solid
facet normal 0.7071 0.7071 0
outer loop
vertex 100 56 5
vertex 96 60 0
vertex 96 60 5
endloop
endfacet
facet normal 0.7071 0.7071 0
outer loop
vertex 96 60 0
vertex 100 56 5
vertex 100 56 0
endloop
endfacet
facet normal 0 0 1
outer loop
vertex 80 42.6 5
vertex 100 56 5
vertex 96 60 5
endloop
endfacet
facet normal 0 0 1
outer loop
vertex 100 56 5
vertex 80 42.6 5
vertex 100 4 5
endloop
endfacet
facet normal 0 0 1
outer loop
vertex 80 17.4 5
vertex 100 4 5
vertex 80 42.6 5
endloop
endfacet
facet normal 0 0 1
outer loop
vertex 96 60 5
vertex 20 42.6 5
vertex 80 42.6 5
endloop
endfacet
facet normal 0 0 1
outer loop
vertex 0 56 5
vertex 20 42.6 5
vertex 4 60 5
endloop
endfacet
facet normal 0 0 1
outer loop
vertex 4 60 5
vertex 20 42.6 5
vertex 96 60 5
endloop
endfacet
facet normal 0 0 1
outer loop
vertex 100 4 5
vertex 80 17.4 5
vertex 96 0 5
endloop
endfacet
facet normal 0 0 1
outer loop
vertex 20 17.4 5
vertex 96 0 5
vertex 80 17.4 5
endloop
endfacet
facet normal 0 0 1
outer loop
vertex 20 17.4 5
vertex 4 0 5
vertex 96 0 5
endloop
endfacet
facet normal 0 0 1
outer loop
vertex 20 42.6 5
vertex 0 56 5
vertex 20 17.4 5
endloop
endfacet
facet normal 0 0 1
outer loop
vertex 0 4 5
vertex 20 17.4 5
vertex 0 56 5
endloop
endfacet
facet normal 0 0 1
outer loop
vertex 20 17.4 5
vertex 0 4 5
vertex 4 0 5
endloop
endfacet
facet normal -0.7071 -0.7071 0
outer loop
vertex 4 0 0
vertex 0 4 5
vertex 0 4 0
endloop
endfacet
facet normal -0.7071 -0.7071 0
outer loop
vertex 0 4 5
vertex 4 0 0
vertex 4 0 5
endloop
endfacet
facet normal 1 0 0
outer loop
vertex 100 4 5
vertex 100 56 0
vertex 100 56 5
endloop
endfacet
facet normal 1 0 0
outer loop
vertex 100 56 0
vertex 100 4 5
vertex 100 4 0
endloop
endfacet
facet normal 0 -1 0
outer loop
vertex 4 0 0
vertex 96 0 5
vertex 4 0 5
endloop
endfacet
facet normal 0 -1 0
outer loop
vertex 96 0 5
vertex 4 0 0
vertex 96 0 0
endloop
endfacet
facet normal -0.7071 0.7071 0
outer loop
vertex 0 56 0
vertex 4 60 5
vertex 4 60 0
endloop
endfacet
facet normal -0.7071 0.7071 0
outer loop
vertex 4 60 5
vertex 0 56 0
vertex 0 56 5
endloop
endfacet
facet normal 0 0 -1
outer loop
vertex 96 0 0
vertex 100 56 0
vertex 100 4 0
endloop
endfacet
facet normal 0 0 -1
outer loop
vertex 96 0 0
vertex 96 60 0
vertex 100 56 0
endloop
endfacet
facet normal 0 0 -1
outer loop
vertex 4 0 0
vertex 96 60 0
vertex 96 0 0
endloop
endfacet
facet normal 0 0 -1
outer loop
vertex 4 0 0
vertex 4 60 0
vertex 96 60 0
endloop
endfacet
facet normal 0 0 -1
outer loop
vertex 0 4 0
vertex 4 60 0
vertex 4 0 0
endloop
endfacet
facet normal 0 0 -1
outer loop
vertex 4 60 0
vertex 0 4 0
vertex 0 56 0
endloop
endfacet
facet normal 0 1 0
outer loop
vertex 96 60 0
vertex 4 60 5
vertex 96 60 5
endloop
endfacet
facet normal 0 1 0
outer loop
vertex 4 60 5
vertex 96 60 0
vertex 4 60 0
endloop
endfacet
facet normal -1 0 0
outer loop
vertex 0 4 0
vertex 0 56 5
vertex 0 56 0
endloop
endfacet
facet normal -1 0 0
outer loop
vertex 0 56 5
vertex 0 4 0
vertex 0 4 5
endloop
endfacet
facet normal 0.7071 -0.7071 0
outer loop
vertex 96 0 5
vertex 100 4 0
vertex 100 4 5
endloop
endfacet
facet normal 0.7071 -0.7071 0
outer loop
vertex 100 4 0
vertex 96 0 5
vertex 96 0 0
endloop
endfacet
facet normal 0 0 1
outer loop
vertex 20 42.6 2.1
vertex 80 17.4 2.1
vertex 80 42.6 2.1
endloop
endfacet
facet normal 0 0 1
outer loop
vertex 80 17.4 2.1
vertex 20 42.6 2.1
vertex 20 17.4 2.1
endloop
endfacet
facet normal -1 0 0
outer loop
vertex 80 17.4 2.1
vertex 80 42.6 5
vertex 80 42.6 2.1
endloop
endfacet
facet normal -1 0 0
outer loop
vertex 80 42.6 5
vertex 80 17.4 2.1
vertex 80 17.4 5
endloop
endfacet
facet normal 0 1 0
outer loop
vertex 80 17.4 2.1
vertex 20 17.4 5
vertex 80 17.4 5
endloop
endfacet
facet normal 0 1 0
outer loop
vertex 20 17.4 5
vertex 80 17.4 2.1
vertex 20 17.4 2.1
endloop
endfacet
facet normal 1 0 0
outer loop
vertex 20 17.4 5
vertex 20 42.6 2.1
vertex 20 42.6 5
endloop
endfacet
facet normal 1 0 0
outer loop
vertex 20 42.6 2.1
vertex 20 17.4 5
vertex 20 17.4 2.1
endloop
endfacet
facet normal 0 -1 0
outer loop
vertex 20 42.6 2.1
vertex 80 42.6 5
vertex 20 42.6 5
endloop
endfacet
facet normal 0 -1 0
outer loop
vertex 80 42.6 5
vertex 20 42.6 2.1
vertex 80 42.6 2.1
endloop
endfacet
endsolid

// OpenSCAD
$fn = 32;

// ----------------------------------------------------------------------
// Windowed plate: 1 voids, 100 x 60 x 5 mm
// ----------------------------------------------------------------------

// --- parameters (mm) ---
plate_l = 100;            // plate length, X
plate_w = 60;             // plate width, Y
plate_t = 5;              // plate thickness, Z
edge_margin = 12;         // wall from the plate edge to any window
win1_l = 60;              // window length
win1_w = 25.2;            // window width
depth_1 = 2.9;            // depth of void 1 (full thickness = through)
corner_c = 4;             // corner chamfer of the plate

profile = [[4, 0], [96, 0], [100, 4], [100, 56], [96, 60], [4, 60], [0, 56], [0, 4]];  // primary outline, 8 points, counter clockwise
void_1 = [[20, 17.4], [80, 17.4], [80, 42.6], [20, 42.6]];  // large central window, 4 points

// --- the one profile operation ---
difference() {
  linear_extrude(height = plate_t) polygon(points = profile);
  translate([0, 0, plate_t - depth_1])
    linear_extrude(height = depth_1 + 1) polygon(points = void_1);
}
